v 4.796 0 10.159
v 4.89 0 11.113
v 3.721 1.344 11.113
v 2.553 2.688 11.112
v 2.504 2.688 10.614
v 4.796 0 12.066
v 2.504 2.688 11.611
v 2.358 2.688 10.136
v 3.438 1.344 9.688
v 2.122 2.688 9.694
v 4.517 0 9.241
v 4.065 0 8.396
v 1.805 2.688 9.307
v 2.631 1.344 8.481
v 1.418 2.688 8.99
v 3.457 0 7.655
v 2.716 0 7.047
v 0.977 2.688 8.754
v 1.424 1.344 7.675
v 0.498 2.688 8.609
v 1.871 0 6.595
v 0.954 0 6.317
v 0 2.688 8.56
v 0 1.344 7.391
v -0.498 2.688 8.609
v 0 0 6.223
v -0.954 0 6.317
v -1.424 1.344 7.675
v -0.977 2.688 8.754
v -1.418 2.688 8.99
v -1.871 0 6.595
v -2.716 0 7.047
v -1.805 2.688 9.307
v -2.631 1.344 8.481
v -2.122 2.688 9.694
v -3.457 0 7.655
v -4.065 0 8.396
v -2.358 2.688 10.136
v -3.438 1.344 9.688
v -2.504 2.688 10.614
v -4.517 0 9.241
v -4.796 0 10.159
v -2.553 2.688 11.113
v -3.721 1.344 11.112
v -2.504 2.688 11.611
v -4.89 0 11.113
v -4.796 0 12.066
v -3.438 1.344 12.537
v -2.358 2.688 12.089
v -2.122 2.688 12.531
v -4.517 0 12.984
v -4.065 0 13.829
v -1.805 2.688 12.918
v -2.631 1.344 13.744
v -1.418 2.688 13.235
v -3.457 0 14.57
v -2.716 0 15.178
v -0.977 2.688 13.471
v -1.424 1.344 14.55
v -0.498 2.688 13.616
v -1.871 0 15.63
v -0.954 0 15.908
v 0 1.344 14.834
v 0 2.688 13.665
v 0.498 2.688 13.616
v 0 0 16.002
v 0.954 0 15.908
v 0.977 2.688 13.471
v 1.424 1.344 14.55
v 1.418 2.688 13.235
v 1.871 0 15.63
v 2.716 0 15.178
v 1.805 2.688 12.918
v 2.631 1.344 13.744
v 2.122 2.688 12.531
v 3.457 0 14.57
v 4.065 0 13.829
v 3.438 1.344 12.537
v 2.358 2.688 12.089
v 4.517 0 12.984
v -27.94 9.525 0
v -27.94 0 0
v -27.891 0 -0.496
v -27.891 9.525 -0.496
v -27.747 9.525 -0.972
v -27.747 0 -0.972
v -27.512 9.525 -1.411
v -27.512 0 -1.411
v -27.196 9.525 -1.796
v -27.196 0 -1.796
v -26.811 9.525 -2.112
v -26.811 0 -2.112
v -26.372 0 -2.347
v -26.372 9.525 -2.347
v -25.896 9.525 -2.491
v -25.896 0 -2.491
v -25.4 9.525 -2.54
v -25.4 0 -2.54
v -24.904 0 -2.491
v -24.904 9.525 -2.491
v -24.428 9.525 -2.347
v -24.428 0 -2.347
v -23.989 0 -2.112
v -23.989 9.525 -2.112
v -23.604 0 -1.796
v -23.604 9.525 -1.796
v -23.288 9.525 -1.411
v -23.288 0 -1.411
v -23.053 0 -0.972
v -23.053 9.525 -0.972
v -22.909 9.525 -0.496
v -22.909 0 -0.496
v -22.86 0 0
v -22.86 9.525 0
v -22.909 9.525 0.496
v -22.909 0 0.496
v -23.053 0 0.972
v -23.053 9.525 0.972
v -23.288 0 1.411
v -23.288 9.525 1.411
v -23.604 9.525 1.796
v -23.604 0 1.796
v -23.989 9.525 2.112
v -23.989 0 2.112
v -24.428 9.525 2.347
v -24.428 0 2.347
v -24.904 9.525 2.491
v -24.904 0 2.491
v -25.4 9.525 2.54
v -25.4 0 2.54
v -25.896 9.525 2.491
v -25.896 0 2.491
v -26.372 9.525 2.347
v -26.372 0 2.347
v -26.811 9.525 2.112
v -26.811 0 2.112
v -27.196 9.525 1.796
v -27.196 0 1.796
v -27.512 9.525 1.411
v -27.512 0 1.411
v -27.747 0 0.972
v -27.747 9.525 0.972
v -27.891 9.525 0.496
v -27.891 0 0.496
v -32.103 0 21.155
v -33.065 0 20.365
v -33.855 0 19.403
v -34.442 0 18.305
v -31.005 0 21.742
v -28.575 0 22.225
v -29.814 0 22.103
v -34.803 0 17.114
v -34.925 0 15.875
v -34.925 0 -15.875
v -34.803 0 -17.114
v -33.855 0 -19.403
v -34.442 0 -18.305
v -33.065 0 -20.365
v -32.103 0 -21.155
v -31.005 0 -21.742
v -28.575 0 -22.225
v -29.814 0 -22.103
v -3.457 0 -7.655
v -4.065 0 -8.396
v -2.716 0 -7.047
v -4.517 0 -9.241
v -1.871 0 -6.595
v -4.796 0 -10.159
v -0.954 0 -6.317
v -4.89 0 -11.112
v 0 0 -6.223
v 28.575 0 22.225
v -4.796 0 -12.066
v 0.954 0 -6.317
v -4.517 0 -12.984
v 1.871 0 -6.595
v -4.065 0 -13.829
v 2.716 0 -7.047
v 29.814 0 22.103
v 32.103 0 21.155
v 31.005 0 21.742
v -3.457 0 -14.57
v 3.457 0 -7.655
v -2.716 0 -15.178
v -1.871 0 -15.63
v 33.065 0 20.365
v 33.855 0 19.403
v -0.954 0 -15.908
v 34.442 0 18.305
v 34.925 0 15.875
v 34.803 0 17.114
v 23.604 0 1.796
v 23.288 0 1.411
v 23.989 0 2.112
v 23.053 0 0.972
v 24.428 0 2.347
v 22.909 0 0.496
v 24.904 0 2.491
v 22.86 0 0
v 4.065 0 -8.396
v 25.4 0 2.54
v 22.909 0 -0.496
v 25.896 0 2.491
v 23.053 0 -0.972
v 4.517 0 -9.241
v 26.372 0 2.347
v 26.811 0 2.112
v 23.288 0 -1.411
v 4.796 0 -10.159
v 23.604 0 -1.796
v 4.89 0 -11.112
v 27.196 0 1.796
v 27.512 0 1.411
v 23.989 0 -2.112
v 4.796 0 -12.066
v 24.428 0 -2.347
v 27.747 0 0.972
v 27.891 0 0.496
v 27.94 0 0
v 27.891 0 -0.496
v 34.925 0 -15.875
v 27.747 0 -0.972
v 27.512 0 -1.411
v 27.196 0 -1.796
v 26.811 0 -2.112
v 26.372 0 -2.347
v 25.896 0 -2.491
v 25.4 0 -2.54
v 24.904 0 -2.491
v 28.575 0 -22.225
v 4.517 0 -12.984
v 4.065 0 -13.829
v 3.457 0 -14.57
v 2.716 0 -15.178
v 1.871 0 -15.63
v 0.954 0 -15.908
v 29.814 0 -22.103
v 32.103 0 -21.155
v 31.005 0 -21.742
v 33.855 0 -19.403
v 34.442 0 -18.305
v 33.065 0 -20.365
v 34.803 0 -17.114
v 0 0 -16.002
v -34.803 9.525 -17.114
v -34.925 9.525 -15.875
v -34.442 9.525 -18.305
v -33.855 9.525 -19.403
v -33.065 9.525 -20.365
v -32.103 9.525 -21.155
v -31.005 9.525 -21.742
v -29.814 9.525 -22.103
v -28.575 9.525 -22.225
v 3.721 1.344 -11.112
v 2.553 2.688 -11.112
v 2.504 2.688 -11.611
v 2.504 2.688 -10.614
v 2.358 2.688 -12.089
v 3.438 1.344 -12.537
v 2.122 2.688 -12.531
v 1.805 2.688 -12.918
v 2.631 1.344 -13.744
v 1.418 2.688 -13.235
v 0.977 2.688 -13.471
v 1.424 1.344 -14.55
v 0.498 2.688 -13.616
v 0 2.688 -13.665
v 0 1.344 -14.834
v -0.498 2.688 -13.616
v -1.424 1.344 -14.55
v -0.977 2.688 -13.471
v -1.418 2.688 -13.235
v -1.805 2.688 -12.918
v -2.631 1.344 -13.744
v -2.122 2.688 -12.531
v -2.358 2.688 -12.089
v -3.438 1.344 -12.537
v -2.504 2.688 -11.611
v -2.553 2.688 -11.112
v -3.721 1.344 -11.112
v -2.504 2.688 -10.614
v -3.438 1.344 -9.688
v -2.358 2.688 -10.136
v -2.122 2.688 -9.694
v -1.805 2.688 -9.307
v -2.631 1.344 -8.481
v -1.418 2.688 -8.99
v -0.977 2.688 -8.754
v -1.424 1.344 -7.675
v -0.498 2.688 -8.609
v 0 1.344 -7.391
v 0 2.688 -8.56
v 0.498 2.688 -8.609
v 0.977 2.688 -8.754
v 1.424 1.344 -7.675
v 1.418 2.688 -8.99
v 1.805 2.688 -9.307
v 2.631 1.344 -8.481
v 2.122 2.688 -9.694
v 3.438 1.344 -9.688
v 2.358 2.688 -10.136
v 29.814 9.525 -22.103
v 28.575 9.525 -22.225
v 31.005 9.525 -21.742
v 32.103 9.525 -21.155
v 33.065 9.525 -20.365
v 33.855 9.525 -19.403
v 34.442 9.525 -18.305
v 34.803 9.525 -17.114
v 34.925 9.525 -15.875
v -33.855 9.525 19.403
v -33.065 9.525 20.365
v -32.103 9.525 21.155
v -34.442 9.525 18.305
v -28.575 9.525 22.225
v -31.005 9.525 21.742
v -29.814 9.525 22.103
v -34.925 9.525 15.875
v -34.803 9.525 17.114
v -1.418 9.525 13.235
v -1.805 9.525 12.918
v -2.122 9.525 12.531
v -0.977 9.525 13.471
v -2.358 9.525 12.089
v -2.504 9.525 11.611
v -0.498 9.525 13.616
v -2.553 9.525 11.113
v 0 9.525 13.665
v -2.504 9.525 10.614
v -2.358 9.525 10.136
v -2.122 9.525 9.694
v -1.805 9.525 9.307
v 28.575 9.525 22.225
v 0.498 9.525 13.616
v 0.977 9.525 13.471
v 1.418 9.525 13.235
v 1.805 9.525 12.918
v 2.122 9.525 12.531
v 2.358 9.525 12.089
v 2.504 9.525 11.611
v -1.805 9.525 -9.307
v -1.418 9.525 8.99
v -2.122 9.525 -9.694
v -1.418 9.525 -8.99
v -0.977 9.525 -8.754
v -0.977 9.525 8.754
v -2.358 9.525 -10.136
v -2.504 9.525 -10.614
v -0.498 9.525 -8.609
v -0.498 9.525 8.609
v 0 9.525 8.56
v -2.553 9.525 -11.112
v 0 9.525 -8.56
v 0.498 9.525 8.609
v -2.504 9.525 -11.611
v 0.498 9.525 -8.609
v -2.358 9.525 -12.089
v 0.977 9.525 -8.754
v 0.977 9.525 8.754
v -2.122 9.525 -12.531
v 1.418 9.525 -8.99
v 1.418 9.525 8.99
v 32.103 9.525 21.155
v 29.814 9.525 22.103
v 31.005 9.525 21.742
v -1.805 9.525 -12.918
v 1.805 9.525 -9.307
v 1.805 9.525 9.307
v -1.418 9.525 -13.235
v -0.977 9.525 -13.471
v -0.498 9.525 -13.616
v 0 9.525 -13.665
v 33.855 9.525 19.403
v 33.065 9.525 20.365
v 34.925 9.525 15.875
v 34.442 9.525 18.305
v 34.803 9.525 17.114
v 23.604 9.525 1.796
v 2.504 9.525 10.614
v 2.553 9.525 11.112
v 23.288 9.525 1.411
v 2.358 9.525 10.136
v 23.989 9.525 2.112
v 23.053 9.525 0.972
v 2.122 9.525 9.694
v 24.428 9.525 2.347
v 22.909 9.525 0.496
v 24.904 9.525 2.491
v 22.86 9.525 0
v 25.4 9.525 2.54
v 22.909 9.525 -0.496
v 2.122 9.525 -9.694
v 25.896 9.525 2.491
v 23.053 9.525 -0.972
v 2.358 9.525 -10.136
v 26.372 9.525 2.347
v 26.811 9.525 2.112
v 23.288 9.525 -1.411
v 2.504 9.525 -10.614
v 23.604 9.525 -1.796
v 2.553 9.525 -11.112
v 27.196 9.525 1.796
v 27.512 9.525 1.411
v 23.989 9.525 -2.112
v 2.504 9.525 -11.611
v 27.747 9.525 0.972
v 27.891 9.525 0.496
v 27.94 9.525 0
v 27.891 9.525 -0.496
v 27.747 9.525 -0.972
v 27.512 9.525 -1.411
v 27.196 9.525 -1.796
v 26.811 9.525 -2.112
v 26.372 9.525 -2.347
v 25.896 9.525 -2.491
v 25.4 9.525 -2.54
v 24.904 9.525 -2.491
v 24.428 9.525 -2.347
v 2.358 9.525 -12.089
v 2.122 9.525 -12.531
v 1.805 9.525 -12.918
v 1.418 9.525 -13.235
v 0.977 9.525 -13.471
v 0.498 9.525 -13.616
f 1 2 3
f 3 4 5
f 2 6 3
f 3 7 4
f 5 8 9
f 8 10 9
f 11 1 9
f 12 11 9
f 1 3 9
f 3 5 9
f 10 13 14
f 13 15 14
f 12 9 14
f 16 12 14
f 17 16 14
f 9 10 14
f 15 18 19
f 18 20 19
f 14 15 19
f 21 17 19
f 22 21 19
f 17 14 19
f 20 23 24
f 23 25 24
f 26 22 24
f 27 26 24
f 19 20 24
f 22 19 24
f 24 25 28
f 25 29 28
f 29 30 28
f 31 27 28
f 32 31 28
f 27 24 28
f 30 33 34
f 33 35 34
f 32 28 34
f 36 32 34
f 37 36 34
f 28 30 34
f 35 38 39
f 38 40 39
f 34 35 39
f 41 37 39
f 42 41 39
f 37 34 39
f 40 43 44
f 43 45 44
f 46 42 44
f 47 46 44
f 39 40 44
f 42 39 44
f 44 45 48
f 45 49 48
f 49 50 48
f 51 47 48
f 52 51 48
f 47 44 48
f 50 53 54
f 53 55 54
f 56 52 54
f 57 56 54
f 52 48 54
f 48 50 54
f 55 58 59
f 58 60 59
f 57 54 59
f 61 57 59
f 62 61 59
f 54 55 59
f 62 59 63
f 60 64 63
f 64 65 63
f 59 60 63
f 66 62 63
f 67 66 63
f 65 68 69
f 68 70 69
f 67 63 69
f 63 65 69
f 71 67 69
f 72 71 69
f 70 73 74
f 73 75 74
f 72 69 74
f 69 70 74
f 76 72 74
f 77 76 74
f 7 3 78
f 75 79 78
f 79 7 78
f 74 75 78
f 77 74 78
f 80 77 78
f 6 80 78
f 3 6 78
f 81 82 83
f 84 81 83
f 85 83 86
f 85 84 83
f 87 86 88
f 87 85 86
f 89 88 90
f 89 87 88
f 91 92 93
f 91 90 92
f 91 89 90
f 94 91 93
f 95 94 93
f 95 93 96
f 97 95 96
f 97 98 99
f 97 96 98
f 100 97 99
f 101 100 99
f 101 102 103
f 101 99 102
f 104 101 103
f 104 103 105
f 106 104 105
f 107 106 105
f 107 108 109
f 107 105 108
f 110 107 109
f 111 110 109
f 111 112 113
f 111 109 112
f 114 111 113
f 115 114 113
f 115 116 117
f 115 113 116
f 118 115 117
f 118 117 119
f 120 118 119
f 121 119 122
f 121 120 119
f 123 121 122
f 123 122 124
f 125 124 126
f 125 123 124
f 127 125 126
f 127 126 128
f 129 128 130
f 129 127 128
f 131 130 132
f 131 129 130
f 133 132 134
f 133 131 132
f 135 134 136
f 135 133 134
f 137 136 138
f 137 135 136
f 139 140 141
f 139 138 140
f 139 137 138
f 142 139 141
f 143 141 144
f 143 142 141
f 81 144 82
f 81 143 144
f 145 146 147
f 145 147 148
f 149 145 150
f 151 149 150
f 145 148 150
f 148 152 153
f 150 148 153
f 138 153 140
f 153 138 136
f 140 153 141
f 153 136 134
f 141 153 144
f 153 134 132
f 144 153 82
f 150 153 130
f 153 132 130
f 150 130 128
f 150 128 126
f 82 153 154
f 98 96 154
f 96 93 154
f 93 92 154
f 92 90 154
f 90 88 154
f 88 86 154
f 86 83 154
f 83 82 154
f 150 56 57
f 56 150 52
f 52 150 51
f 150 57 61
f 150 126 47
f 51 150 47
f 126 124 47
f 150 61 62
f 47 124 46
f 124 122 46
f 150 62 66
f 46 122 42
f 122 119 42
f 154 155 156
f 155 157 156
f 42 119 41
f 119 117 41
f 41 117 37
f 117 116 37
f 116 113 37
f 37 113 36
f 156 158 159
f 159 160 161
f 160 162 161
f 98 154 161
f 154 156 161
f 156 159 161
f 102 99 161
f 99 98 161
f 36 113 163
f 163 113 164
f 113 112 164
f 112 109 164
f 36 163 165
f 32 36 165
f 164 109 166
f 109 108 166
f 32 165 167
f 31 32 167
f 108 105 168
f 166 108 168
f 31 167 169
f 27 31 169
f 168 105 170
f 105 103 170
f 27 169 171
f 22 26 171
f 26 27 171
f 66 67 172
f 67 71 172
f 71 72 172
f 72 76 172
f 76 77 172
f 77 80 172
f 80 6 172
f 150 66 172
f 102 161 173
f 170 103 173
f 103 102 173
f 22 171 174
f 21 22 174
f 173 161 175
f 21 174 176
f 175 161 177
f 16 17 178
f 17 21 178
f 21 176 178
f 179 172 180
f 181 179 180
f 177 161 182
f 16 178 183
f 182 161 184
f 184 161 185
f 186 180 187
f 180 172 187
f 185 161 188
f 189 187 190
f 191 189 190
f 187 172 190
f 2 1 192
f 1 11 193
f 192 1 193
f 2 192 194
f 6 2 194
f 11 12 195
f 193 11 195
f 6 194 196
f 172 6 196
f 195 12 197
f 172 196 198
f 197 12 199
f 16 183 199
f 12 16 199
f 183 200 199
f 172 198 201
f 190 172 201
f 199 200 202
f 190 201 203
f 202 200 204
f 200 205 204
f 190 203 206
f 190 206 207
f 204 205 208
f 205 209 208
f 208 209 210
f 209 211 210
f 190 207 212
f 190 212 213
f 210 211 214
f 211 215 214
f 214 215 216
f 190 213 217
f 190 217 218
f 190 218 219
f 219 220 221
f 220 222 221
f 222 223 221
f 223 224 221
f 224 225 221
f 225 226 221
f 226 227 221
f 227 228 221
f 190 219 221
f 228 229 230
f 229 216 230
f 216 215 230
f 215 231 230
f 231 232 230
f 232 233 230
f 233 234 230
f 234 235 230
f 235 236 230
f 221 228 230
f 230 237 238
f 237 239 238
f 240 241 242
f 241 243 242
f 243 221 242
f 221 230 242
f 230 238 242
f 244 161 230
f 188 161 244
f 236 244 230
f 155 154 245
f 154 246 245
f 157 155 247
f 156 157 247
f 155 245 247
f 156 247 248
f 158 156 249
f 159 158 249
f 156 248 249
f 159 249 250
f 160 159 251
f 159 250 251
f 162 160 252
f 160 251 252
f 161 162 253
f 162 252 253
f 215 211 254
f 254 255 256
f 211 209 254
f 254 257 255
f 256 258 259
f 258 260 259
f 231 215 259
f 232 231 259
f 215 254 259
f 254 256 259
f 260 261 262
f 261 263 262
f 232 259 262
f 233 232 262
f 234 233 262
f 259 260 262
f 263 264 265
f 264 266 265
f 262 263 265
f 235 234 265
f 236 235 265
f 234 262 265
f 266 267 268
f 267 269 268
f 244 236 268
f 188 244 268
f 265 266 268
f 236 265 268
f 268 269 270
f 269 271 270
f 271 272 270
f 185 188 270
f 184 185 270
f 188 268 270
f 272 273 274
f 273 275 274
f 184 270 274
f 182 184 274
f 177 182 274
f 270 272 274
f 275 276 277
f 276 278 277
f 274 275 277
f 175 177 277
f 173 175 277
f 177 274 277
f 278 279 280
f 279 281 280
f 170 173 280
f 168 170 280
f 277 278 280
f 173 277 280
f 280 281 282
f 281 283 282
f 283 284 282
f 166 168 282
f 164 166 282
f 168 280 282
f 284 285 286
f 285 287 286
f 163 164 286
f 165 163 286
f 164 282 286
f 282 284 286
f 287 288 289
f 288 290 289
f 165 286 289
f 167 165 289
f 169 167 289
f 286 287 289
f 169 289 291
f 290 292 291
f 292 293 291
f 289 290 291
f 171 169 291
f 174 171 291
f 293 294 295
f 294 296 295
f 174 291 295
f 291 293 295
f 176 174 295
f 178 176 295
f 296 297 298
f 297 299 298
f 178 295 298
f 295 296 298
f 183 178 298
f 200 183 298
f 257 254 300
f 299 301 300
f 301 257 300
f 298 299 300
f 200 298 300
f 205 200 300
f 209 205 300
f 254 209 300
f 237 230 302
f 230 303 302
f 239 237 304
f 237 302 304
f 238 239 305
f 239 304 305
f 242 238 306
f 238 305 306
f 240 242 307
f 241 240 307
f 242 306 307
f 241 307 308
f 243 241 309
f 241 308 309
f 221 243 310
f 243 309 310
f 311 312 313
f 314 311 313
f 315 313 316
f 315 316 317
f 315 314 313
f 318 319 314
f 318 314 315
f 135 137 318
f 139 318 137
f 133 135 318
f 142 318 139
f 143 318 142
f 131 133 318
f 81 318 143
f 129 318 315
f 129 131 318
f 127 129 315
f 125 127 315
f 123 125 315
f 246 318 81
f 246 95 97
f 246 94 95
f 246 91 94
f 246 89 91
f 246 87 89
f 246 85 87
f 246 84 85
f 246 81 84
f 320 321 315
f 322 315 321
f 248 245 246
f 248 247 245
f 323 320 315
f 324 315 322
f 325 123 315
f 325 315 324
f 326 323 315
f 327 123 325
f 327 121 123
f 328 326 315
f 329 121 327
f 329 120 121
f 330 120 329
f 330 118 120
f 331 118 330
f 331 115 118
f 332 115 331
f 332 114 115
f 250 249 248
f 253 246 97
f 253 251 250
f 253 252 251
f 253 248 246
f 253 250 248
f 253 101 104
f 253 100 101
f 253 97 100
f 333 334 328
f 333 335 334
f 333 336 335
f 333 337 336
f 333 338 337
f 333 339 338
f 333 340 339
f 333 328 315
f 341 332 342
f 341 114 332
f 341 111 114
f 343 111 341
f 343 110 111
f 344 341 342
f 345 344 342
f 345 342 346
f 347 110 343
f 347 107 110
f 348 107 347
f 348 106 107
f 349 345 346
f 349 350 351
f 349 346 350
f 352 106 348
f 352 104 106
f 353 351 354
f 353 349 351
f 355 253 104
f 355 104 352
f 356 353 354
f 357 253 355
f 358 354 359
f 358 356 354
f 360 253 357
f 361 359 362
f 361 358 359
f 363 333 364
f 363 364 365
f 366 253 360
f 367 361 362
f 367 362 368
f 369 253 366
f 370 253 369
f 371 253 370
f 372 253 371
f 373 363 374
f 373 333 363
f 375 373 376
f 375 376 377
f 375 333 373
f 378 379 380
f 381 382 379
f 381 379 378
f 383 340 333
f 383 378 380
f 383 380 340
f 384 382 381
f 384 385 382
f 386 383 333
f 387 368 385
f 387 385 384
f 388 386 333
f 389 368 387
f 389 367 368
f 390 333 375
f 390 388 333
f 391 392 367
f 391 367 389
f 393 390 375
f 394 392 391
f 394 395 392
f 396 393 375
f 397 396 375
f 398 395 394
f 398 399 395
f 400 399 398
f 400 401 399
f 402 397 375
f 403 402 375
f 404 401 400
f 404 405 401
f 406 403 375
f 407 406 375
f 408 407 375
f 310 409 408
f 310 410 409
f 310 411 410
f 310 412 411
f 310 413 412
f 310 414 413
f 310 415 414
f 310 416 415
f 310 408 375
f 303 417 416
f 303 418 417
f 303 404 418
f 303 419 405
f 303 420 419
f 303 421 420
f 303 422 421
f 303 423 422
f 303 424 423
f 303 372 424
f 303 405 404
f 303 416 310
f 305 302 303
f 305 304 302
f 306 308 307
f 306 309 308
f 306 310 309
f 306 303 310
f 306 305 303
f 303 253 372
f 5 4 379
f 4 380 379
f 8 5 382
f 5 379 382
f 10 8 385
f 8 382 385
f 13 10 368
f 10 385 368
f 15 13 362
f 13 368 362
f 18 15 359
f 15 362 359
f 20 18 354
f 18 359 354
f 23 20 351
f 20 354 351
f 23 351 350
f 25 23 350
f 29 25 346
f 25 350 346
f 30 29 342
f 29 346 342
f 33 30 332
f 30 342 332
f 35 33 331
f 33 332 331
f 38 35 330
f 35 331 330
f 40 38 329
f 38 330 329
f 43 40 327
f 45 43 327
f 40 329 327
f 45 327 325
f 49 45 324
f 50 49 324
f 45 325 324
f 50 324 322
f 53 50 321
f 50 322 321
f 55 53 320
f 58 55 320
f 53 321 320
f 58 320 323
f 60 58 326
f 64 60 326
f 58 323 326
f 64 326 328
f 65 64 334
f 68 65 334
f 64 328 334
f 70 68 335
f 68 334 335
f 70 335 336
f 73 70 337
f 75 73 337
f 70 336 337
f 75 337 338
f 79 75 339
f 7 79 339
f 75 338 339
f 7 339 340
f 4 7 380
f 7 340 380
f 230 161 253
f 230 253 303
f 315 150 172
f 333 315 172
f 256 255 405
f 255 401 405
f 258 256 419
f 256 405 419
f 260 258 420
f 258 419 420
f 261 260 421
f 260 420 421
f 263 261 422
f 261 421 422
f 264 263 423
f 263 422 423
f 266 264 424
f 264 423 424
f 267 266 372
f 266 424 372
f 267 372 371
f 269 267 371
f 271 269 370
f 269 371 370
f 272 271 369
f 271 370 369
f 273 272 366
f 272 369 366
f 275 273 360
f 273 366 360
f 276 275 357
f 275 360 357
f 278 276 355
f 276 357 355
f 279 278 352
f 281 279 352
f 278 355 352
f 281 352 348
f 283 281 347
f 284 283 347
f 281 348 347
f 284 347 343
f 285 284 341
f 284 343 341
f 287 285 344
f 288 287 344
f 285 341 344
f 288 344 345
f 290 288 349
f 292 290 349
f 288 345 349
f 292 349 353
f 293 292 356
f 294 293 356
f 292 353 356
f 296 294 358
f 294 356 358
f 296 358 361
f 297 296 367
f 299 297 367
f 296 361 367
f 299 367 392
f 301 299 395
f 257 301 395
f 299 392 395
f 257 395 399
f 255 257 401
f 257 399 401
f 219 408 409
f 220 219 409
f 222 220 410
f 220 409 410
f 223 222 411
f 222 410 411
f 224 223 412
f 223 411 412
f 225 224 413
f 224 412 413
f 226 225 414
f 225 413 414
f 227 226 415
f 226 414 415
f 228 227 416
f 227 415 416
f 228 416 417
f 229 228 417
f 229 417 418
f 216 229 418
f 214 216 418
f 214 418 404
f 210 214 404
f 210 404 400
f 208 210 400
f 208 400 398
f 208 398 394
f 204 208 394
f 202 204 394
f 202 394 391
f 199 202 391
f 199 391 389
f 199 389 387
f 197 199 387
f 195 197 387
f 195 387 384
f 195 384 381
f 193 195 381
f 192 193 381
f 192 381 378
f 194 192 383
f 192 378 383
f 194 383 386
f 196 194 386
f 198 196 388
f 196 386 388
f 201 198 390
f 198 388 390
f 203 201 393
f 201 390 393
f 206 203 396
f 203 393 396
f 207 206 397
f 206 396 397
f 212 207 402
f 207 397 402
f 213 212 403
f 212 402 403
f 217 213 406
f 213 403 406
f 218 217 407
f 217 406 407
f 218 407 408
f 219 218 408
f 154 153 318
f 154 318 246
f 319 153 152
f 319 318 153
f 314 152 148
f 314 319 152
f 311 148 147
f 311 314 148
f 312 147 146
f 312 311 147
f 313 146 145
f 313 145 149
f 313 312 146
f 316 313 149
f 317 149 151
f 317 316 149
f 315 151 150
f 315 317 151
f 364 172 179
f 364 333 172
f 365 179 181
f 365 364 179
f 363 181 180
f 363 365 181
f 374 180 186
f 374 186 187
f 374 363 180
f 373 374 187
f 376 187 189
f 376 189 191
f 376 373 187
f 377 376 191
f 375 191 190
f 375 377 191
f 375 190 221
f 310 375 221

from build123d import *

# Parameters (mm, degrees)
SKETCH1_W                                          = 69.85
SKETCH1_H                                          = 44.45
BOSS_EXTRUDE1_DEPTH                                = 9.525
CSK_FOR_10_FLAT_HEAD_MACHINE_SCREW_100_D           = 5.1054
CSK_FOR_10_FLAT_HEAD_MACHINE_SCREW_100_CSINK_D     = 9.779
CSK_FOR_10_FLAT_HEAD_MACHINE_SCREW_100_CSINK_ANGLE = 82
F_10_0_2_DIAMETER_HOLE1_D                          = 5.08
FILLET4_R                                          = 6.35


with BuildPart() as part:
    # Sketch1 → Boss-Extrude1 (new body)
    with BuildSketch(Plane(origin=(0, 0, 0), x_dir=(1, 0, 0), z_dir=(0, 1, 0))):
        Rectangle(SKETCH1_W, SKETCH1_H)
    extrude(amount=BOSS_EXTRUDE1_DEPTH)

    # CSK for #10 Flat Head Machine Screw (100)1 (through all)
    with Locations(Plane(origin=(0, 0, 0), x_dir=(-1, 0, 0), z_dir=(0, -1, 0))):
        with Locations((0, 11.1125), (0, -11.1125)):
            CounterSinkHole(CSK_FOR_10_FLAT_HEAD_MACHINE_SCREW_100_D / 2, CSK_FOR_10_FLAT_HEAD_MACHINE_SCREW_100_CSINK_D / 2, counter_sink_angle=CSK_FOR_10_FLAT_HEAD_MACHINE_SCREW_100_CSINK_ANGLE)

    # #10 (0.2) Diameter Hole1 (through all)
    with Locations(Plane(origin=(0, 0, 0), x_dir=(-1, 0, 0), z_dir=(0, -1, 0))):
        with Locations((-25.4, 0)):
            f_10_0_2_diameter_hole1 = Hole(F_10_0_2_DIAMETER_HOLE1_D / 2)

    # Mirror1: #10 (0.2) Diameter Hole1 across plane
    add(f_10_0_2_diameter_hole1.mirror(Plane(origin=(0, 0, 0), x_dir=(0, 0, 1), z_dir=(1, 0, 0))), mode=Mode.SUBTRACT)

    # Fillet4
    fillet4_edges = [part.edges().sort_by_distance(p)[0] for p in [
        (34.925, 4.7625, 22.225),
        (-34.925, 4.7625, 22.225),
        (-34.925, 4.7625, -22.225),
        (34.925, 4.7625, -22.225),
    ]]
    fillet(fillet4_edges, radius=FILLET4_R)


solid = part.part
